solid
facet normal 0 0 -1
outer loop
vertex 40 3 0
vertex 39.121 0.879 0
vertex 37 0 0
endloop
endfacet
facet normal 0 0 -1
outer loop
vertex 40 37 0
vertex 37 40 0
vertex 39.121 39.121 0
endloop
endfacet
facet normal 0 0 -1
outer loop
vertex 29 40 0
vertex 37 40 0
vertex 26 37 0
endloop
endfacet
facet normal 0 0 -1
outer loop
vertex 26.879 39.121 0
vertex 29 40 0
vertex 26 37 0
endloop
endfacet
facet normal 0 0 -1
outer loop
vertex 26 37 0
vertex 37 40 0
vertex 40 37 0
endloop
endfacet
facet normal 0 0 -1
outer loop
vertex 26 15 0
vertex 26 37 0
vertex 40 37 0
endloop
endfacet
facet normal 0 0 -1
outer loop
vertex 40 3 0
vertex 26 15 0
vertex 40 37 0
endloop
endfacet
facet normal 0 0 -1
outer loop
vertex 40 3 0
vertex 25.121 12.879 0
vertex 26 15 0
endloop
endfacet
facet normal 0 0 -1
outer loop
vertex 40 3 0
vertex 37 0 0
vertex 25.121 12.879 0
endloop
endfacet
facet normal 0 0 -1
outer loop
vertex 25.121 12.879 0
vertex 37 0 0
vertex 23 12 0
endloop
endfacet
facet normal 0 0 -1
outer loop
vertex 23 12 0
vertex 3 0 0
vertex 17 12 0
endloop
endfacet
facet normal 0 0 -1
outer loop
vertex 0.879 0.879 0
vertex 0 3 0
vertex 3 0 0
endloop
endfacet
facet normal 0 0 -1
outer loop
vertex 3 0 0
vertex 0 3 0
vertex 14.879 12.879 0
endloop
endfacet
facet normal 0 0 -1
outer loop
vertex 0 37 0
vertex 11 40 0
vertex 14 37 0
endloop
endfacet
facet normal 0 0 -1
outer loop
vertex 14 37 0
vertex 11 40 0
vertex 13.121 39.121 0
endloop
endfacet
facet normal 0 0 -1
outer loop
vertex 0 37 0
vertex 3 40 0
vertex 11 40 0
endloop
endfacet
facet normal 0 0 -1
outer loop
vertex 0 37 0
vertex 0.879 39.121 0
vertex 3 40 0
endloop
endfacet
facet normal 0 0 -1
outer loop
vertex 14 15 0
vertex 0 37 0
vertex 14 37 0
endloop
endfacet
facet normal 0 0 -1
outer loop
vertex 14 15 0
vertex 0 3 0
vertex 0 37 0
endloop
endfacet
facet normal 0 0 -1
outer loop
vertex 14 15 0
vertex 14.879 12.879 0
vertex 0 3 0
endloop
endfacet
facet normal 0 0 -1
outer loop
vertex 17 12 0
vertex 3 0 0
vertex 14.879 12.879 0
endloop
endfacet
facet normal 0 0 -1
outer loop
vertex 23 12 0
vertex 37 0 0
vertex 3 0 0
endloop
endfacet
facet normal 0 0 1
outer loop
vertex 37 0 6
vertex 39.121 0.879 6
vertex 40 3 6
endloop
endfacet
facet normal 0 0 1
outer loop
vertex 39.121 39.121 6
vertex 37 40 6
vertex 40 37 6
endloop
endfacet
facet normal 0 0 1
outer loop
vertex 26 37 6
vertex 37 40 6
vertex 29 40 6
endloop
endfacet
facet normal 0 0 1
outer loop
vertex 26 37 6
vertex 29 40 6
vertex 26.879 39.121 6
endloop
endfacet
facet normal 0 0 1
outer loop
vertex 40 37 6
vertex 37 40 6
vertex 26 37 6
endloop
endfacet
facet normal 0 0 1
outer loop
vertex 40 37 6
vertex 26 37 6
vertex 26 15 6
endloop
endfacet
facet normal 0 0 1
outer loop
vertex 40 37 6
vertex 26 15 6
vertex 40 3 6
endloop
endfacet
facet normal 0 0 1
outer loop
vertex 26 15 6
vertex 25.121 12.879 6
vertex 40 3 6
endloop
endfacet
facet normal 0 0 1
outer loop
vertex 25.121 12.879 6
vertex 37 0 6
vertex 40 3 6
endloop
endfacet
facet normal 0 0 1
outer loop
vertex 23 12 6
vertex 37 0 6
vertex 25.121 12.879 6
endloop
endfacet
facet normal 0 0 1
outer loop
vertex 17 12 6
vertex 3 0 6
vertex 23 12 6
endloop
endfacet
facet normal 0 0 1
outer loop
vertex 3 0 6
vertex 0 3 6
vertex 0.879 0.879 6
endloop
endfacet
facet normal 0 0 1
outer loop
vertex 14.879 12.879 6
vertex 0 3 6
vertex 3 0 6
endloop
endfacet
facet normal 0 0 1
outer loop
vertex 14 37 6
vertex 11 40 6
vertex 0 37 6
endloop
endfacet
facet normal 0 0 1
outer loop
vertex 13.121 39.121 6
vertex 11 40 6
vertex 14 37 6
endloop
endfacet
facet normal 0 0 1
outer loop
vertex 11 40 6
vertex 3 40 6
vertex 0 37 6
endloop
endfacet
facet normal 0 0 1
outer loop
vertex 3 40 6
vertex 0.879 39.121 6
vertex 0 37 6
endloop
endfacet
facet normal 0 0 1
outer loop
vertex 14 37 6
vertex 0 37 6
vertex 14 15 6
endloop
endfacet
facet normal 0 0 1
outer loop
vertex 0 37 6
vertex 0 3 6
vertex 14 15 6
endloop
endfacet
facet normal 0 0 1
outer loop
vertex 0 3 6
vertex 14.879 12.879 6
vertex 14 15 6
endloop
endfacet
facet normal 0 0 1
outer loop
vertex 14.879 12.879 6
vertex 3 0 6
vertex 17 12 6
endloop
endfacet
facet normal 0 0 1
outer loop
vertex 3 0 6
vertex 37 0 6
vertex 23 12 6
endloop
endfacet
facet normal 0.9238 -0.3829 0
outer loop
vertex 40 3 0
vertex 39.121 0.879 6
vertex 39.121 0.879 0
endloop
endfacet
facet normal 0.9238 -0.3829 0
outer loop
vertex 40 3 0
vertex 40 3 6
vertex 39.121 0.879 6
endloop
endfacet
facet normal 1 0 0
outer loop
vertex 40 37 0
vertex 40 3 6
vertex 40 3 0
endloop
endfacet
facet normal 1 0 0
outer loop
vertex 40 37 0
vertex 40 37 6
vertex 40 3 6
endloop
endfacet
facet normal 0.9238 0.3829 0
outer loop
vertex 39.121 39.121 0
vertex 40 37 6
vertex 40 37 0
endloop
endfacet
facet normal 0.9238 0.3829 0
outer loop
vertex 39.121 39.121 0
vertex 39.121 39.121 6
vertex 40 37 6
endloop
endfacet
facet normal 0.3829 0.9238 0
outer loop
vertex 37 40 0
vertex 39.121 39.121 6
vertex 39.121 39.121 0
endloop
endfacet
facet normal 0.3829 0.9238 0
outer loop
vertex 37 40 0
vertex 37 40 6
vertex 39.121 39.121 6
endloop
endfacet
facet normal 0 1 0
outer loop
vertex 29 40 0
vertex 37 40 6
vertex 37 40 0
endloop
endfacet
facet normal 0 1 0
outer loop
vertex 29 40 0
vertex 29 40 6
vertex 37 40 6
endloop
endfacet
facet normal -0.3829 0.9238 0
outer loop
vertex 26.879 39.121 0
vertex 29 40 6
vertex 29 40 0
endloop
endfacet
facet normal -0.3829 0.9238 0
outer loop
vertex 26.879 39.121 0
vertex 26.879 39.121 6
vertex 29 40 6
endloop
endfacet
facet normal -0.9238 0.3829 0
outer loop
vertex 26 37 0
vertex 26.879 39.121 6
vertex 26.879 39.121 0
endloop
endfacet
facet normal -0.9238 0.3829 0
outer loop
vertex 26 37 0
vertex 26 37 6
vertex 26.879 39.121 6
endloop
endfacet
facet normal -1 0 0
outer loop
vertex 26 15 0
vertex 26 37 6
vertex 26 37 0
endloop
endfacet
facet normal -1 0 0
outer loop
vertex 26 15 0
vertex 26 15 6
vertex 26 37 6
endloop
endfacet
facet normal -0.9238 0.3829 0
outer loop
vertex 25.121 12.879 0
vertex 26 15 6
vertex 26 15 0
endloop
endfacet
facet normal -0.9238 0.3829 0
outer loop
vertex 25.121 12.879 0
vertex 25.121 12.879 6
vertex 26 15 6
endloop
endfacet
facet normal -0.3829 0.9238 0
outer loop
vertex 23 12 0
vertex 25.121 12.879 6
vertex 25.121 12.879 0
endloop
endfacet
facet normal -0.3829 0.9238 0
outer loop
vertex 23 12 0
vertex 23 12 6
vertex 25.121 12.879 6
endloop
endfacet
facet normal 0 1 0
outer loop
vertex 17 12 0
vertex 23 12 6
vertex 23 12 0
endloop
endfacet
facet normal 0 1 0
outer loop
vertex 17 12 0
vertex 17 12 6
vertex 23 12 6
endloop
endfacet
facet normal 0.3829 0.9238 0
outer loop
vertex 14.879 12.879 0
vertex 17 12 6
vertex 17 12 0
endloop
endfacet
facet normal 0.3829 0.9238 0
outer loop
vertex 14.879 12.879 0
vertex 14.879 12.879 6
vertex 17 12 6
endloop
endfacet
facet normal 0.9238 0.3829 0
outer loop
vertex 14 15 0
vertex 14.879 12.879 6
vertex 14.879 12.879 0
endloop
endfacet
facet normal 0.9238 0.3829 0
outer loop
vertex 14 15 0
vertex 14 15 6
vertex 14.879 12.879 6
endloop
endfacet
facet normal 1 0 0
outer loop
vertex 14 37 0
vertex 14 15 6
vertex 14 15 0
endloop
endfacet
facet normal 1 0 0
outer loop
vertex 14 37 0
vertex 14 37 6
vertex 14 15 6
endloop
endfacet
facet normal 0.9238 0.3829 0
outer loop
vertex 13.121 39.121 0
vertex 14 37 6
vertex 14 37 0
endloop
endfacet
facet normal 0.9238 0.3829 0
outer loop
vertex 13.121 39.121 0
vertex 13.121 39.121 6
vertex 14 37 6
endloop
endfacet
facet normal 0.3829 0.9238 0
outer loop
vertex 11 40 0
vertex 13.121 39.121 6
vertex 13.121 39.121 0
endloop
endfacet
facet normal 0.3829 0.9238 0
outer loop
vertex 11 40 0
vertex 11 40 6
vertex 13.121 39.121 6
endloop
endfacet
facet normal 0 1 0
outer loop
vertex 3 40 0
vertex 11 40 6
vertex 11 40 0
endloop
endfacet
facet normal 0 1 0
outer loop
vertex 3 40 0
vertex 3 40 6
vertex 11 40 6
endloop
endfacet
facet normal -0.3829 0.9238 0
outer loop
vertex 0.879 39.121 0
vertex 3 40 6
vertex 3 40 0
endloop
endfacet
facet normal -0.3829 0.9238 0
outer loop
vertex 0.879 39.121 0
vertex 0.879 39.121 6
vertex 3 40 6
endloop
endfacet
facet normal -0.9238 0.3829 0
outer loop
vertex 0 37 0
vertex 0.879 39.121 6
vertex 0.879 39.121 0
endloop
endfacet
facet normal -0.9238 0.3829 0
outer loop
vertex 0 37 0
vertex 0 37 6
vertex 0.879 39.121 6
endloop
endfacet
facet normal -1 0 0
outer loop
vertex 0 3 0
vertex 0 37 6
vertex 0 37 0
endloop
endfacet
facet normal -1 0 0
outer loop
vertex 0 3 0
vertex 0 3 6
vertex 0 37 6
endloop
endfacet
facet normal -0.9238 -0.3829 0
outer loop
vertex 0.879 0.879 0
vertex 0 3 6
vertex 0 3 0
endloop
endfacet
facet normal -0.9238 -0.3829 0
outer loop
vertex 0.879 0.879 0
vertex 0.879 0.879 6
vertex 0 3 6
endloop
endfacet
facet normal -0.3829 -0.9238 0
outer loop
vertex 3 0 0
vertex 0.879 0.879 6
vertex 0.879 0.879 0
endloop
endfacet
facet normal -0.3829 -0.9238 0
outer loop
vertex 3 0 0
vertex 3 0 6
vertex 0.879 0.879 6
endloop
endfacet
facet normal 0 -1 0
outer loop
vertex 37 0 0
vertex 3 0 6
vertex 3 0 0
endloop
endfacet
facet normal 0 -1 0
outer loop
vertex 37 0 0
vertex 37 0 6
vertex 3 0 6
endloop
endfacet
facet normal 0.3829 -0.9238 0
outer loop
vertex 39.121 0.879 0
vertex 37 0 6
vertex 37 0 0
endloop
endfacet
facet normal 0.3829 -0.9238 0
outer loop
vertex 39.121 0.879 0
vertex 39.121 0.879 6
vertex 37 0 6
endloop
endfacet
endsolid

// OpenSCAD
$fn = 32;

// ----------------------------------------------------------------------
// Eye lug: clevis, 6 mm thick
// ----------------------------------------------------------------------

// --- parameters (mm) ---
profile_height = 6;       // extrusion height
profile_points = 24;      // points of the closed outline

profile = [[0, 3], [0.879, 0.879], [3, 0], [37, 0], [39.121, 0.879], [40, 3], [40, 37], [39.121, 39.121], [37, 40], [29, 40], [26.879, 39.121], [26, 37], [26, 15], [25.121, 12.879], [23, 12], [17, 12], [14.879, 12.879], [14, 15], [14, 37], [13.121, 39.121], [11, 40], [3, 40], [0.879, 39.121], [0, 37]];  // single closed polygon, 24 points, counter clockwise

// --- the one profile operation ---
linear_extrude(height = profile_height) polygon(points = profile);
